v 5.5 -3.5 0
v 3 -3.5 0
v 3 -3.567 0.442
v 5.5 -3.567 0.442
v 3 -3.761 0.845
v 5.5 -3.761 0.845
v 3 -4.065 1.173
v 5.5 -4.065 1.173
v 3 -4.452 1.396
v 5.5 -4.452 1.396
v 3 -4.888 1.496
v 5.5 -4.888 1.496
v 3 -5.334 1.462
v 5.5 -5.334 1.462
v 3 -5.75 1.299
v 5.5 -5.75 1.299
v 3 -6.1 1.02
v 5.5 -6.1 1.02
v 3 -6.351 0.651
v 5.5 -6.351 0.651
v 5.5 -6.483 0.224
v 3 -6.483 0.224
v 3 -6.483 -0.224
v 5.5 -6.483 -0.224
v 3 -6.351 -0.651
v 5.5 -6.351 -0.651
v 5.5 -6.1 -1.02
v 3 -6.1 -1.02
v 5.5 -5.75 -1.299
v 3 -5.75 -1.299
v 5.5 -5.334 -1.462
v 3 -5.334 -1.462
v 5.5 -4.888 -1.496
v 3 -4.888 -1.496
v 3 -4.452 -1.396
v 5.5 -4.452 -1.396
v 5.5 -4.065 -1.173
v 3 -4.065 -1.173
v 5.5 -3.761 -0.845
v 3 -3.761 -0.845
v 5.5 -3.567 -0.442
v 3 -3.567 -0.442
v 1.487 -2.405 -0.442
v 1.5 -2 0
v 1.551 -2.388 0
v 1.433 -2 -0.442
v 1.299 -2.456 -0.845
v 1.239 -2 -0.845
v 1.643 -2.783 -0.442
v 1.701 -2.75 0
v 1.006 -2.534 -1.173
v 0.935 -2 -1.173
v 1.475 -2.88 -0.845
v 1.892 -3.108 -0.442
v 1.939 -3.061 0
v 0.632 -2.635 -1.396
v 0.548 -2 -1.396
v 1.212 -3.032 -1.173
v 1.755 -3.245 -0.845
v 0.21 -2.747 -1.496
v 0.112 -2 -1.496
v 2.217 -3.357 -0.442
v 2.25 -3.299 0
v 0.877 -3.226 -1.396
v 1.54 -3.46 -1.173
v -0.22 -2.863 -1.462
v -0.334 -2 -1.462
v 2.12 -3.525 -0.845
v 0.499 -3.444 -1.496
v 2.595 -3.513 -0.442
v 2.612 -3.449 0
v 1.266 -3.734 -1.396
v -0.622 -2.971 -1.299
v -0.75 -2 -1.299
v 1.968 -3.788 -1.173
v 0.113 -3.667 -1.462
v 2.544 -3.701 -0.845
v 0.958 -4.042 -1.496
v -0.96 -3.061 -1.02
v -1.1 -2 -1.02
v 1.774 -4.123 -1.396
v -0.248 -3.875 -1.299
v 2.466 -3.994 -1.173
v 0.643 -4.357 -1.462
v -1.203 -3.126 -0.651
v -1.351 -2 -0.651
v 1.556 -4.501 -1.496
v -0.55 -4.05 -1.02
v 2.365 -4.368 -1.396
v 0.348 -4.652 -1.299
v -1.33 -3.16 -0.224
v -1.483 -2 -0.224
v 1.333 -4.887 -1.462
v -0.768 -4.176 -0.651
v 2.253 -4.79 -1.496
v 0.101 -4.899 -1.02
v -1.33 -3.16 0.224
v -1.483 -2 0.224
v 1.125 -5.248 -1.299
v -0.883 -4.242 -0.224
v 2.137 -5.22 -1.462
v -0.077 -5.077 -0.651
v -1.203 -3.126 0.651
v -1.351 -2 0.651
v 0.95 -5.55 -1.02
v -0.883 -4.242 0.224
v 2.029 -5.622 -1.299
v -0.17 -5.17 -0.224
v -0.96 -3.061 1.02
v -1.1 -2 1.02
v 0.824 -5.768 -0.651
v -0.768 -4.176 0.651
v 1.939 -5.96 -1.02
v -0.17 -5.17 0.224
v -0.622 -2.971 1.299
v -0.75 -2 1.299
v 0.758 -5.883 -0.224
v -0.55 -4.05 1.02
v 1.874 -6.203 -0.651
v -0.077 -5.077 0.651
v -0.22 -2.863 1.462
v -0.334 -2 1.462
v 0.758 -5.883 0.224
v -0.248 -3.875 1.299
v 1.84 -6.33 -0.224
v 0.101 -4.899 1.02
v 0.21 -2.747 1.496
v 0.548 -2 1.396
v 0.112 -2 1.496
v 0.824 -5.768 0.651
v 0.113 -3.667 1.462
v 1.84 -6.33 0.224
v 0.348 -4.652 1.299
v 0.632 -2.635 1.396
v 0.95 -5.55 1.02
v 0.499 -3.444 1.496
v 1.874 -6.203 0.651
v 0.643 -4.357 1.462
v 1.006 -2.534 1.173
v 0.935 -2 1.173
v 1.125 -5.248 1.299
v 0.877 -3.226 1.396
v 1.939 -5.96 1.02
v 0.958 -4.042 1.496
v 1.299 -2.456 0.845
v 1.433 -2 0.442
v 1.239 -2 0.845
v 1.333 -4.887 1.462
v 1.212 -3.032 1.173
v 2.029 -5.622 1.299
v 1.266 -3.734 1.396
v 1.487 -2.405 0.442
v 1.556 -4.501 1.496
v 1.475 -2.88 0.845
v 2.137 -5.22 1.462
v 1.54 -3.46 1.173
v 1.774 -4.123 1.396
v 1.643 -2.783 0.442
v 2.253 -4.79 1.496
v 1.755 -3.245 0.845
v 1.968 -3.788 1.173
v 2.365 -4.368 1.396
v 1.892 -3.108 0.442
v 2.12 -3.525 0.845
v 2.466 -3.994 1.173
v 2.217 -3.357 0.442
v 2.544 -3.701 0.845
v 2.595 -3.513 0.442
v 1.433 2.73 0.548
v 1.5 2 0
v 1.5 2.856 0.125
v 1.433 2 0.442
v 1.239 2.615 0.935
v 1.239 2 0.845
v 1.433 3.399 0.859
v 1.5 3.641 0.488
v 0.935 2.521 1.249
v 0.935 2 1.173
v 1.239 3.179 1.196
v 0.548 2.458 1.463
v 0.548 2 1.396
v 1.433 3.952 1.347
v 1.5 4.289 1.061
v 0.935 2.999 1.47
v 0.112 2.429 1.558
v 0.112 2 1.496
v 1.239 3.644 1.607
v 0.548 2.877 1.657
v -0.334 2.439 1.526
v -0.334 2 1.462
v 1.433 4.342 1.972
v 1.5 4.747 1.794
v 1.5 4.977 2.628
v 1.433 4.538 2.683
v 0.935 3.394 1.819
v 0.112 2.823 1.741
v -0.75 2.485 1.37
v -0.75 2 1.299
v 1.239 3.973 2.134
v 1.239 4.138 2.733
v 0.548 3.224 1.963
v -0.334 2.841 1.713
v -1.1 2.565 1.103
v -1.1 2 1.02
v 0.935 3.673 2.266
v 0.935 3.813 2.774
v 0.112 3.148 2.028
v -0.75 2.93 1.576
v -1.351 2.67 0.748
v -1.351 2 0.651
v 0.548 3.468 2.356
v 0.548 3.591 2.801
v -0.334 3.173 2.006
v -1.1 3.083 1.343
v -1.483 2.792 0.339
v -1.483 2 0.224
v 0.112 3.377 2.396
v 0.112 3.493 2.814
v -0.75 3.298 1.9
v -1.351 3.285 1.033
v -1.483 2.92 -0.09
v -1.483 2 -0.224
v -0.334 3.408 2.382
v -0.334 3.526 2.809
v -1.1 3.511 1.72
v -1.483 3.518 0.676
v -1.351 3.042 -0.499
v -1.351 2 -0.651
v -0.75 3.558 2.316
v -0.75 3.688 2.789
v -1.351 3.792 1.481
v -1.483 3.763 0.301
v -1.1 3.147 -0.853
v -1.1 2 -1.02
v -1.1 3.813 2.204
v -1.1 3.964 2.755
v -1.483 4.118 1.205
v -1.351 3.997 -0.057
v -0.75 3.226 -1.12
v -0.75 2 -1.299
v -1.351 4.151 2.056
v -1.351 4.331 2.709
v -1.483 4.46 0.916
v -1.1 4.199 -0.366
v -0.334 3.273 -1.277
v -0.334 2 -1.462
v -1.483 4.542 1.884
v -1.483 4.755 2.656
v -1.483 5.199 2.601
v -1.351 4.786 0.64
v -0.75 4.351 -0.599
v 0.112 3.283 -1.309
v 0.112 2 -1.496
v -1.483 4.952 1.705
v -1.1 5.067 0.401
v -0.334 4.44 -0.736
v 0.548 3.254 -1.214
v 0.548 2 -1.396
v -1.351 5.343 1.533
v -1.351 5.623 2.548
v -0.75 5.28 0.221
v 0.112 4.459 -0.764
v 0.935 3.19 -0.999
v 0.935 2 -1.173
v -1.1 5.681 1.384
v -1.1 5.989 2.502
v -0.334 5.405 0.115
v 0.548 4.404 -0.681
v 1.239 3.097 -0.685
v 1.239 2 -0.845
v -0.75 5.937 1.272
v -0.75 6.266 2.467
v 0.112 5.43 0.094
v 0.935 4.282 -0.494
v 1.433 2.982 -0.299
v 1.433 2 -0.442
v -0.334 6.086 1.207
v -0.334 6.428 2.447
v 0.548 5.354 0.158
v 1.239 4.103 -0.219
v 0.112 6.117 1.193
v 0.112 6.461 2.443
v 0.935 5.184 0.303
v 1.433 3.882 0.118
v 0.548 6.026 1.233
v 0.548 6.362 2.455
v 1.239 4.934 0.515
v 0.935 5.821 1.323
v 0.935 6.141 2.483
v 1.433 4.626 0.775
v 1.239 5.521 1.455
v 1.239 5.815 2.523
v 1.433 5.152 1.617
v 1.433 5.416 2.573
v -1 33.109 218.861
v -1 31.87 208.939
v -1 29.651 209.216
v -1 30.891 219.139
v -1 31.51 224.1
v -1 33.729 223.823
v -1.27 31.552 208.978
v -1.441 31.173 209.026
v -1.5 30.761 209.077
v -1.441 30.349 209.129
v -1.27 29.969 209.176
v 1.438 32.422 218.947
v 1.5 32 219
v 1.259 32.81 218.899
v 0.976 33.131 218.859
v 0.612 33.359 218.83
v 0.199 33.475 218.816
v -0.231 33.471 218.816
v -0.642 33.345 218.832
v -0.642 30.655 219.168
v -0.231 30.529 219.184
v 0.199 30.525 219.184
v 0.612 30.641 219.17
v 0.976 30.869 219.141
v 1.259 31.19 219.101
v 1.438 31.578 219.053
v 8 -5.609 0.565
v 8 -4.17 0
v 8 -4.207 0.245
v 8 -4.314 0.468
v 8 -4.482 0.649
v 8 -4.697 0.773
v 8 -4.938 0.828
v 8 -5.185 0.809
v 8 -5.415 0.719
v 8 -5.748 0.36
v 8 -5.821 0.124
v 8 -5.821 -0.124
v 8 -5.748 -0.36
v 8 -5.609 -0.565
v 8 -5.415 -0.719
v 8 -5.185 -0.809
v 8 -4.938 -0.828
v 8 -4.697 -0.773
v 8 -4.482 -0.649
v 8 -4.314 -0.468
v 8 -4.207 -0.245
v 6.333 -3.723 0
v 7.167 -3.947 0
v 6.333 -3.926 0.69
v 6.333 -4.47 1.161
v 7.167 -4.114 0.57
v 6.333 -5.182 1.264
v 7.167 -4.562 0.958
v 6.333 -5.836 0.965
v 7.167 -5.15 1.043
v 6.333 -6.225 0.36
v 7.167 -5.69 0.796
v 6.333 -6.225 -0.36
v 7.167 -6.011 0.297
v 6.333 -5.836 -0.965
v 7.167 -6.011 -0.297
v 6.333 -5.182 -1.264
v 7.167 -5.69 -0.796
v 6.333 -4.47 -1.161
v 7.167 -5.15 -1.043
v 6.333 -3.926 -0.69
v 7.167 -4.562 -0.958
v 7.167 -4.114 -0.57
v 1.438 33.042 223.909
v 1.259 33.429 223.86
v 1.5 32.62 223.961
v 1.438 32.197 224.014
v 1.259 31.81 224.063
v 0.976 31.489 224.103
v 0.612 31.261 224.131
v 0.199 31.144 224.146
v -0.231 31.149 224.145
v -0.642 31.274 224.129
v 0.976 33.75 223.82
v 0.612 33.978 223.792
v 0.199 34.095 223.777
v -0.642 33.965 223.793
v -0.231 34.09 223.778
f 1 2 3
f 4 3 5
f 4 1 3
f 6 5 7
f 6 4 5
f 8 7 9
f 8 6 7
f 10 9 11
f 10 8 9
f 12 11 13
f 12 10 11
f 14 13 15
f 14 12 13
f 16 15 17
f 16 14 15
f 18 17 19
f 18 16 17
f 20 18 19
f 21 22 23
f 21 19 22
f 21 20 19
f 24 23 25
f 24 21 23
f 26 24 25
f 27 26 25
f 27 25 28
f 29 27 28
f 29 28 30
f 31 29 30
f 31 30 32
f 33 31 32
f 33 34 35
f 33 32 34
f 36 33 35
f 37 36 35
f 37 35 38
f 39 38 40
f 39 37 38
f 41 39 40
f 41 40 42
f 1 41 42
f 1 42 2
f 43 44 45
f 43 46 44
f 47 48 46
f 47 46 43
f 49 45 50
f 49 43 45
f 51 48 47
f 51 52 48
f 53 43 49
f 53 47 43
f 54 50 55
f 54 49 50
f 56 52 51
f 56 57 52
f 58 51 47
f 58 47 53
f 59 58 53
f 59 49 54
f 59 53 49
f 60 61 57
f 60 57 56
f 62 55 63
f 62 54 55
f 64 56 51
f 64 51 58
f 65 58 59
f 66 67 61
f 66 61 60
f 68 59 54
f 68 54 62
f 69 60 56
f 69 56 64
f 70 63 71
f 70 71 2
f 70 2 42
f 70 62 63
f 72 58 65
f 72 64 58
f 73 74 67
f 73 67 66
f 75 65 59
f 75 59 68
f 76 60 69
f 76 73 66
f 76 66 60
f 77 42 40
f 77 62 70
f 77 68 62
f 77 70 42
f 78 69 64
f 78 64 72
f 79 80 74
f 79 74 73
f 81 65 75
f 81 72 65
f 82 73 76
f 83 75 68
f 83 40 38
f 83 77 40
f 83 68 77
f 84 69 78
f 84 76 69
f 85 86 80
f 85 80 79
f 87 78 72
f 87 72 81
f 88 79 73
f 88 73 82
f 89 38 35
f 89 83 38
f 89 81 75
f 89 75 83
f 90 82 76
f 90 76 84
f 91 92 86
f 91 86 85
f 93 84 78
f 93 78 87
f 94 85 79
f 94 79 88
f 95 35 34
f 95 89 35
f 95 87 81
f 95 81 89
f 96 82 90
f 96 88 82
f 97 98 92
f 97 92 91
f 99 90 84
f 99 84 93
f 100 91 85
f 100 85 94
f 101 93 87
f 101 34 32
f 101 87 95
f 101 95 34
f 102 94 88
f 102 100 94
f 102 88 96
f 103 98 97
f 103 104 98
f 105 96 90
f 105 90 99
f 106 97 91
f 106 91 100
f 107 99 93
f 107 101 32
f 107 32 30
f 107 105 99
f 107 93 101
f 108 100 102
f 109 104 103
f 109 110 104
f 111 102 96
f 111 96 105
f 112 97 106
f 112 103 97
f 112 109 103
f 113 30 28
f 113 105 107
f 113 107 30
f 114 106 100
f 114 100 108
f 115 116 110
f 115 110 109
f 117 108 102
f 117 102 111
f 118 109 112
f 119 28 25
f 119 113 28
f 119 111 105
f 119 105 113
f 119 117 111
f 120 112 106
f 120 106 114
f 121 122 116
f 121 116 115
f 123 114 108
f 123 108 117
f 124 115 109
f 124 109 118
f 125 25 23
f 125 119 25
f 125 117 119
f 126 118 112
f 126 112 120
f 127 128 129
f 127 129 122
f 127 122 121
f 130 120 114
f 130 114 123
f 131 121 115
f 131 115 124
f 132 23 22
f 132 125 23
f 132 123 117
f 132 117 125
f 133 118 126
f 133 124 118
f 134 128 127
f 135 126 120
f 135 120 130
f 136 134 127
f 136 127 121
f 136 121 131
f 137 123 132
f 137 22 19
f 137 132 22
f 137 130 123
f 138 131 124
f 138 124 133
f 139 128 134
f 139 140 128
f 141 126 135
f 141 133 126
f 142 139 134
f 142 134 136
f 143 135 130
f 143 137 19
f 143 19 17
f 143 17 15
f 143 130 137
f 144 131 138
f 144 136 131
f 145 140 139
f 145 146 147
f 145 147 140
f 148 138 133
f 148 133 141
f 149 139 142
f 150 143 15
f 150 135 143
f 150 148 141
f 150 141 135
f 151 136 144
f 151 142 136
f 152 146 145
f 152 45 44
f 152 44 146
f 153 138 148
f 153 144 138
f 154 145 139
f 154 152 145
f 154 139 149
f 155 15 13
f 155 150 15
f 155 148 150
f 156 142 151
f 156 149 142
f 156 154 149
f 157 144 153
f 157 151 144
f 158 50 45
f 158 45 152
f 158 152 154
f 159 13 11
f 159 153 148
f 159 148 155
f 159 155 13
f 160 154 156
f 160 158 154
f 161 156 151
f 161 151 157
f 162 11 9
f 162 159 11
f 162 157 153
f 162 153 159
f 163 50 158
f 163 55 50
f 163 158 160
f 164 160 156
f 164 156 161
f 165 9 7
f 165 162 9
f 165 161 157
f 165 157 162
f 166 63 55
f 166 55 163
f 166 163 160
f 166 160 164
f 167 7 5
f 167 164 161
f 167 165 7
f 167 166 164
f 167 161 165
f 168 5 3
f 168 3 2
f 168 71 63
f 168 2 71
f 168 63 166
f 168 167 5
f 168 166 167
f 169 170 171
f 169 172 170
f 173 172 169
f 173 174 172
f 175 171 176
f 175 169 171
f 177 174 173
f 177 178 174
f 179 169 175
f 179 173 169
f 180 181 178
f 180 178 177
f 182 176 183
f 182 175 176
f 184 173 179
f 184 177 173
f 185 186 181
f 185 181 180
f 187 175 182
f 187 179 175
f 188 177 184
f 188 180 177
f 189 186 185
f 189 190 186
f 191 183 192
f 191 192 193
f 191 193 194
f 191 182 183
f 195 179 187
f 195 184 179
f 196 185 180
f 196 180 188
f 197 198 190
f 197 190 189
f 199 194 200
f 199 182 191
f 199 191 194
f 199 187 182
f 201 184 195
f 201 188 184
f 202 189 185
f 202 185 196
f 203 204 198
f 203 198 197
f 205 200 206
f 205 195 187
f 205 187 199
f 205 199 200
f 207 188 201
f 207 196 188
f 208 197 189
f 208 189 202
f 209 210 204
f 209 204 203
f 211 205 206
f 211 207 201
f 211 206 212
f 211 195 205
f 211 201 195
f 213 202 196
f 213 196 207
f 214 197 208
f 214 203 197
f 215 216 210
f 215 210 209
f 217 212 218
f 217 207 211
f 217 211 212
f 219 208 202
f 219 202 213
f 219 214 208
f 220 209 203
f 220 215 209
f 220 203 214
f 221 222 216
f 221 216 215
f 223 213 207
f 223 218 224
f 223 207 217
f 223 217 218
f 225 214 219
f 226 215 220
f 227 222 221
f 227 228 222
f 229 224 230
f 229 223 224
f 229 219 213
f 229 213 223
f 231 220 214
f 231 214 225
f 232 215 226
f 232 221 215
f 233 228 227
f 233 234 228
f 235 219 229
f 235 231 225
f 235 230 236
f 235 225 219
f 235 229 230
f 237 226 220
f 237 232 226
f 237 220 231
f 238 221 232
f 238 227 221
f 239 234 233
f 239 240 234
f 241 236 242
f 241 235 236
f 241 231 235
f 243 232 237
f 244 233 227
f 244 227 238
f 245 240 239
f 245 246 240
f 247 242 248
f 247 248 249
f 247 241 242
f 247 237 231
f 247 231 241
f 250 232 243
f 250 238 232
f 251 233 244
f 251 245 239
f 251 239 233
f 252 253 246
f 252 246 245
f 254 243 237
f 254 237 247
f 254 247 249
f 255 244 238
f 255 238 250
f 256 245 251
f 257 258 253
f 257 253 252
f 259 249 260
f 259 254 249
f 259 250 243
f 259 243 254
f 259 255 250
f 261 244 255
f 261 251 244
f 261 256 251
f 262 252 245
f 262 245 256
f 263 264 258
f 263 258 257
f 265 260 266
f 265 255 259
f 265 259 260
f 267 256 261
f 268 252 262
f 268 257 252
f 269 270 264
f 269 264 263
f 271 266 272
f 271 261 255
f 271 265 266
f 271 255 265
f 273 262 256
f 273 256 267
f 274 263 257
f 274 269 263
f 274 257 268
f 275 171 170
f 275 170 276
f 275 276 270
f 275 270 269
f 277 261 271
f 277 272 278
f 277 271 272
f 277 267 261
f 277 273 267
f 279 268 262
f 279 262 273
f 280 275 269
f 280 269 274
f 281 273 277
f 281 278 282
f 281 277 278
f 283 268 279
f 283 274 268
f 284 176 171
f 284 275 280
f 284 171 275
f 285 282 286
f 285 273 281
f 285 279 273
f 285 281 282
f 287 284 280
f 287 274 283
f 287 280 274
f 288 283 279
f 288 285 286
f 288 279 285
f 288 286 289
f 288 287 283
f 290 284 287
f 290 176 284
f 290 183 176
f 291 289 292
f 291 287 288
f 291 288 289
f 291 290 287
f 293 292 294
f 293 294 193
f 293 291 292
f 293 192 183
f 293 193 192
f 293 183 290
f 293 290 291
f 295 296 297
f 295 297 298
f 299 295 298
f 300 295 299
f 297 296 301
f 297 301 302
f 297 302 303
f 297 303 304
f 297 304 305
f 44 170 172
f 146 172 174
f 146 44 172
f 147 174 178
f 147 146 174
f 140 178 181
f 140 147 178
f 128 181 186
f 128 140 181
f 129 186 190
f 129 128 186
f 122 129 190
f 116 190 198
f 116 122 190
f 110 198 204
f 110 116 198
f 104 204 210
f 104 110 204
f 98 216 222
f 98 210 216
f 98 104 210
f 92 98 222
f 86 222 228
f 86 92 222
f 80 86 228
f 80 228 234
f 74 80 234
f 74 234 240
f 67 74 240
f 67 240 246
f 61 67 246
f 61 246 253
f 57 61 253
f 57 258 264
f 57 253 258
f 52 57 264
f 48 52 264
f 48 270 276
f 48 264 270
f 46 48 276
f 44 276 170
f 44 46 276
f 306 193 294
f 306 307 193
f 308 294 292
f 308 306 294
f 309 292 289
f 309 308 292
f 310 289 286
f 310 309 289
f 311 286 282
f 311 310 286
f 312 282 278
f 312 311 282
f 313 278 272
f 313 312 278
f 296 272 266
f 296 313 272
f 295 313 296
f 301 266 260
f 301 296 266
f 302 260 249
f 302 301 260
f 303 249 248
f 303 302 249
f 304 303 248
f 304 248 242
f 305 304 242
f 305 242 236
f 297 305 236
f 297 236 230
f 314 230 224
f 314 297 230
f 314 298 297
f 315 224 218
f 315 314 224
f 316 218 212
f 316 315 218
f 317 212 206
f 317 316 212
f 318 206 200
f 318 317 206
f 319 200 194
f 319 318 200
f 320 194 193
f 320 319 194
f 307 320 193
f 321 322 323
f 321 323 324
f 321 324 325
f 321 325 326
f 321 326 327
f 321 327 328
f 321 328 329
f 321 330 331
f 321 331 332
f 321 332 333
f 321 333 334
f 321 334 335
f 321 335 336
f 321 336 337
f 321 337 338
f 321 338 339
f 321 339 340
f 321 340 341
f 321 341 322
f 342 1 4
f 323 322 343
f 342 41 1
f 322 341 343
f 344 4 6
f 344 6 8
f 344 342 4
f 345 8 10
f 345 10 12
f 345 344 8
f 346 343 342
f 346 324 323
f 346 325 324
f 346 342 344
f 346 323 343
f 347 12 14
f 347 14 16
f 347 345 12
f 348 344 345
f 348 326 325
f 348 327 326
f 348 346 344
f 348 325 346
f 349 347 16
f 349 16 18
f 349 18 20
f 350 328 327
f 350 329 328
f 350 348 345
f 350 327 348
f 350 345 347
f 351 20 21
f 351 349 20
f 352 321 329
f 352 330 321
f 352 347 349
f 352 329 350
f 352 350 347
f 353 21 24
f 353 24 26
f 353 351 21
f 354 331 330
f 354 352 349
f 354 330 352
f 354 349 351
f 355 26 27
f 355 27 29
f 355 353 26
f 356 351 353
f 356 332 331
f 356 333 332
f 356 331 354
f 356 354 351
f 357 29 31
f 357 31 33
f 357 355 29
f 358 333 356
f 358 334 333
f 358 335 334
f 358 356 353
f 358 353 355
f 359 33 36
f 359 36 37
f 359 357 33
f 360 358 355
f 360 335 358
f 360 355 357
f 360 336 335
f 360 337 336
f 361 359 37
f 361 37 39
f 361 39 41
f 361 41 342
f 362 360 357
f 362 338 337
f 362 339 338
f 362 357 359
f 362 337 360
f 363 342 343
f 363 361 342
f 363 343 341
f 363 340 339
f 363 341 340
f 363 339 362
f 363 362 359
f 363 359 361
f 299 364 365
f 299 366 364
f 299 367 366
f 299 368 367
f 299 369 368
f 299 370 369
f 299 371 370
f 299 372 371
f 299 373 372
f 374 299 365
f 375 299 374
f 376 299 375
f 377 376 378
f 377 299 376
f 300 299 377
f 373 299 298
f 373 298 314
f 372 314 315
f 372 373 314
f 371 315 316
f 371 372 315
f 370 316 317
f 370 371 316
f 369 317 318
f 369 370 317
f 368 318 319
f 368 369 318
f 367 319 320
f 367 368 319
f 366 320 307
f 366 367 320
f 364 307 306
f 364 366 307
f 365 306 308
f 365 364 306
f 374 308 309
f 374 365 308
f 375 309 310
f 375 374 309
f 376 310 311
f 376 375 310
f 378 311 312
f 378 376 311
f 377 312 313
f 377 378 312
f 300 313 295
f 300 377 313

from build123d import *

# Parameters (mm, degrees)
SKETCH2_R          = 1.5
SKETCH4_R          = 1.5
CHAMFER1_SIZE      = 2.5
CHAMFER1_SIZE2     = 0.669872981
CUT_EXTRUDE1_DEPTH = 1.5000001


with BuildPart() as part:
    # Sweep1: sweep along a path in Sketch1
    with BuildLine(Plane(origin=(0, 0, 0), x_dir=(0, 0, -1), z_dir=(1, 0, 0))) as sweep1_path:
        Line((0, 0), (0, 2))
        ThreePointArc((0, 2), (-0.751070943, 3.985527158), (-2.628212063, 4.976873146))
        Line((-2.628212063, 4.976873146), (-219, 32))
        Line((-219, 32), (-223.961455244, 32.619646562))
    # Sketch2 → Sweep1 (sweep)
    with BuildSketch(Plane(origin=(0, 0, 0), x_dir=(1, 0, 0), z_dir=(0, 1, 0))):
        Circle(SKETCH2_R)
    sweep(path=sweep1_path.line)

    # Sweep2: sweep along a path in Sketch3
    with BuildLine(Plane.XY) as sweep2_path:
        Line((0, 0), (0, -2))
        ThreePointArc((0, -2), (0.878679656, -4.121320344), (3, -5))
        Line((3, -5), (8, -5))
    # Sketch4 → Sweep2 (sweep)
    with BuildSketch(Plane.XZ):
        Circle(SKETCH4_R)
    sweep(path=sweep2_path.line)

    # Chamfer1
    chamfer1_edges = [part.edges().sort_by_distance(p)[0] for p in [
        (8, -6.5, 0),
    ]]
    chamfer1_side = [part.faces().sort_by_distance(p)[0] for p in [
        (5.5, -6.5, 0),
    ]]
    chamfer(chamfer1_edges, length=CHAMFER1_SIZE, length2=CHAMFER1_SIZE2, reference=chamfer1_side[0])

    # Sketch5 → Cut-Extrude1 (cut, through all)
    with BuildSketch(Plane(origin=(-1, 0, 0), x_dir=(0, 0, -1), z_dir=(1, 0, 0))):
        Polygon((-224.209313869, 30.635064464), (-223.713596619, 34.604228659), (-208.829230887, 32.745288974), (-209.324948137, 28.776124779), align=None)
    extrude(amount=-CUT_EXTRUDE1_DEPTH, mode=Mode.SUBTRACT)


solid = part.part
